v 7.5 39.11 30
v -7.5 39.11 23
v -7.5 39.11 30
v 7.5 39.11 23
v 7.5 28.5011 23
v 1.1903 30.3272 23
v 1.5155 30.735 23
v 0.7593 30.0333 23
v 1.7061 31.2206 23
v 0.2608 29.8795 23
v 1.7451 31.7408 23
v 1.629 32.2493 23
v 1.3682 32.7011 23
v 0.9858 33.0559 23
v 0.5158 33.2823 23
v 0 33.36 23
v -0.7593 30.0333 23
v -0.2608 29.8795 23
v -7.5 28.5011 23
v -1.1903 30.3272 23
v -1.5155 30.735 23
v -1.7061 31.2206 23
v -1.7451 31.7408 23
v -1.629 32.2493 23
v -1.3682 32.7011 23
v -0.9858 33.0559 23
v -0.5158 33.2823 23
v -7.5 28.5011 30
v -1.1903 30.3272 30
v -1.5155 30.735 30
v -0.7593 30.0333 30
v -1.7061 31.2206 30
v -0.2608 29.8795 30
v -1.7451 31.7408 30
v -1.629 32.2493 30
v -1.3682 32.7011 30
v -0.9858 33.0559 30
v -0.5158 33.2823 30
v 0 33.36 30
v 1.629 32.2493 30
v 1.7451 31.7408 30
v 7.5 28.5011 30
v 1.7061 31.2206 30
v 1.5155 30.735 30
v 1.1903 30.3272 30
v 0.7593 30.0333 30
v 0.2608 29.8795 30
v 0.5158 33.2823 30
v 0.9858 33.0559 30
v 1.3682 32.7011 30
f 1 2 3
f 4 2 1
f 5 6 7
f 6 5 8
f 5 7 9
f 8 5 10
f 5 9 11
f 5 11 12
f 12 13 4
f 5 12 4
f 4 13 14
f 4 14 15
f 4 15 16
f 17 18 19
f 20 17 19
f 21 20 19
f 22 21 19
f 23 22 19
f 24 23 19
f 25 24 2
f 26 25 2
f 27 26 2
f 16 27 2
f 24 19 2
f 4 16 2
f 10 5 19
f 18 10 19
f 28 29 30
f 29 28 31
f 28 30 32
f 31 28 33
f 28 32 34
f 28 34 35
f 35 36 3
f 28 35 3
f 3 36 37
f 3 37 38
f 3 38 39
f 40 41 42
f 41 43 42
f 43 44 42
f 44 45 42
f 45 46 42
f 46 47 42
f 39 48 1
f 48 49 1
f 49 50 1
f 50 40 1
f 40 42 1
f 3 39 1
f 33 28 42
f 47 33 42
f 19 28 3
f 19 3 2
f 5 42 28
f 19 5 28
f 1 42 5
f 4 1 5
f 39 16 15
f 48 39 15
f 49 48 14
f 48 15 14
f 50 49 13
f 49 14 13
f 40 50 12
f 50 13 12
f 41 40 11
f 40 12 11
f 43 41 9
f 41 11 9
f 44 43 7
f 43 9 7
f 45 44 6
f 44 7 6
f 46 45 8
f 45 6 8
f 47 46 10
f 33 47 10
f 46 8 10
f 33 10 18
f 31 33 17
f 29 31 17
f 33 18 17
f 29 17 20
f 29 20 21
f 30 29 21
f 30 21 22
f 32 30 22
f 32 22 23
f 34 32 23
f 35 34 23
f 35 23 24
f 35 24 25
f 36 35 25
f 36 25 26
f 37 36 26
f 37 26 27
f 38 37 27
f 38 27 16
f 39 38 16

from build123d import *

# Parameters (mm, degrees)
SKETCH1_W                = 15
SKETCH1_H                = 60
BOSS_EXTRUDE2_DEPTH      = 39.11
BOSS_EXTRUDE3_DEPTH      = 12
BOSS_EXTRUDE3_DEPTH_BACK = 27
SKETCH3_W                = 60
SKETCH3_H                = 5
RIB1_REACH               = 55.008
SKETCH5_WALL_W           = 127.334599132
SKETCH5_WALL_H           = 10
SKETCH6_R                = 1.5
CUT_EXTRUDE2_DEPTH       = 50.434219929
SKETCH7_W                = 16
SKETCH7_H                = 16
CUT_EXTRUDE3_DEPTH       = 57.201353187
SKETCH8_R                = 1.75
CUT_EXTRUDE4_DEPTH       = 75.228310637
FILLET1_R                = 3
CUT_EXTRUDE5_DEPTH       = 75.228310637
SKETCH11_W               = 15
SKETCH11_H               = 10.608893068
CUT_EXTRUDE6_DEPTH       = 67.293605272


with BuildPart() as part:
    # Sketch1 → Boss-Extrude2 (new body)
    with BuildSketch(Plane(origin=(0, 0, 0), x_dir=(1, 0, 0), z_dir=(0, 1, 0))):
        Rectangle(SKETCH1_W, SKETCH1_H)
    extrude(amount=BOSS_EXTRUDE2_DEPTH)

    # Sketch3 → Boss-Extrude3 (add, two sides: drawn at the far end of the back side and taken through both)
    with BuildSketch(Plane.ZY.offset(7.5).offset(-BOSS_EXTRUDE3_DEPTH_BACK)):
        with Locations((0, 2.5)):
            Rectangle(SKETCH3_W, SKETCH3_H)
    extrude(amount=BOSS_EXTRUDE3_DEPTH + BOSS_EXTRUDE3_DEPTH_BACK)

    # Sketch5 wall → Rib1 (add, up to next)
    with BuildSketch(Plane(origin=(-12.037058369, 13.5275, 0), x_dir=(-0.46970610176, -0.882822846311, 0), z_dir=(0.882822846311, -0.46970610176, 0)), mode=Mode.PRIVATE) as rib1_sk1:
        Rectangle(SKETCH5_WALL_W, SKETCH5_WALL_H)
    rib1_tool1 = extrude(rib1_sk1.sketch, amount=RIB1_REACH, mode=Mode.PRIVATE) - part.part
    rib1 = rib1_tool1.solids().sort_by_distance((-12.037058369, 13.5275, 0))[0]
    add(rib1)

    # Sketch6 → Cut-Extrude2 (cut, through all)
    with BuildSketch(Plane(origin=(0, 5, 0), x_dir=(1, 0, 0), z_dir=(0, 1, 0))):
        with Locations((-14.5, -25)):
            Circle(SKETCH6_R)
        with Locations((-14.5, 25)):
            Circle(SKETCH6_R)
    cut_extrude2 = extrude(amount=-CUT_EXTRUDE2_DEPTH, mode=Mode.SUBTRACT)

    # Mirror1: Rib1, Cut-Extrude2 across plane
    add(rib1.mirror(Plane(origin=(0, 0, 0), x_dir=(0, 0, 1), z_dir=(1, 0, 0))))
    add(cut_extrude2.mirror(Plane(origin=(0, 0, 0), x_dir=(0, 0, 1), z_dir=(1, 0, 0))), mode=Mode.SUBTRACT)

    # Sketch7 → Cut-Extrude3 (cut, through all)
    with BuildSketch(Plane.ZY.offset(7.5)):
        with Locations((15, 31.11)):
            Rectangle(SKETCH7_W, SKETCH7_H)
    cut_extrude3 = extrude(amount=-CUT_EXTRUDE3_DEPTH, mode=Mode.SUBTRACT)

    # Mirror2: Cut-Extrude3 across plane
    add(cut_extrude3.mirror(Plane.XY), mode=Mode.SUBTRACT)

    # Sketch8 → Cut-Extrude4 (cut, through all)
    with BuildSketch(Plane(origin=(0, 0, -30), x_dir=(-1, 0, 0), z_dir=(0, 0, -1))):
        with Locations((0, 31.61)):
            Circle(SKETCH8_R)
    extrude(amount=-CUT_EXTRUDE4_DEPTH, mode=Mode.SUBTRACT)

    # Fillet1
    fillet1_edges = [part.edges().sort_by_distance(p)[0] for p in [
        (-16.574116738, 5, 0),
        (-7.5, 5, -17.5),
        (-7.5, 5, 17.5),
        (16.574116738, 5, 0),
        (7.5, 5, 17.5),
        (7.5, 5, -17.5),
    ]]
    fillet(fillet1_edges, radius=FILLET1_R)
    fillet1_2_edges = [part.edges().sort_by_distance(p)[0] for p in [
        (19.5, 2.5, -30),
        (19.5, 2.5, 30),
        (-19.5, 2.5, 30),
        (-19.5, 2.5, -30),
    ]]
    fillet(fillet1_2_edges, radius=FILLET1_R)

    # Sketch10 → Cut-Extrude5 (cut, through all)
    with BuildSketch(Plane.XY.offset(30)):
        Polygon((7.5, 28.501106932), (-7.5, 28.501106932), (-22.220470771, 28.501106932), (-22.220470771, 0), (19.5, 0), (19.5, 28.501106932), align=None)
    extrude(amount=-CUT_EXTRUDE5_DEPTH, mode=Mode.SUBTRACT)


with BuildPart() as cut_extrude5_piece_1:
    # of the separate pieces the step leaves, piece 1, a body of its own (cut_extrude5_pieces)
    add(part.part.solids().sort_by_distance((7.5, 39.11, 7))[0])


with BuildPart() as cut_extrude5_piece_2:
    # of the separate pieces the step leaves, piece 2, a body of its own (cut_extrude5_pieces)
    add(part.part.solids().sort_by_distance((7.5, 28.501106932, 30))[0])


with BuildPart() as cut_extrude5_piece_3:
    # of the separate pieces the step leaves, piece 3, a body of its own (cut_extrude5_pieces)
    add(part.part.solids().sort_by_distance((-7.5, 28.501106932, -30))[0])


with BuildPart() as cut_extrude6_tool:
    # Sketch11 → Cut-Extrude6 (new, through all)
    with BuildSketch(Plane(origin=(0, 0, 23), x_dir=(-1, 0, 0), z_dir=(0, 0, -1))):
        with Locations((0, 33.805553466)):
            Rectangle(SKETCH11_W, SKETCH11_H)
    extrude(amount=CUT_EXTRUDE6_DEPTH)


with BuildPart() as cut_extrude5_piece_1_1:
    add(cut_extrude5_piece_1.part)

    # Cut-Extrude6: cut by cut_extrude6_tool
    add(cut_extrude6_tool.part, mode=Mode.SUBTRACT)


with BuildPart() as cut_extrude5_piece_3_1:
    add(cut_extrude5_piece_3.part)

    # Cut-Extrude6: cut by cut_extrude6_tool
    add(cut_extrude6_tool.part, mode=Mode.SUBTRACT)


solid = cut_extrude5_piece_2.part
